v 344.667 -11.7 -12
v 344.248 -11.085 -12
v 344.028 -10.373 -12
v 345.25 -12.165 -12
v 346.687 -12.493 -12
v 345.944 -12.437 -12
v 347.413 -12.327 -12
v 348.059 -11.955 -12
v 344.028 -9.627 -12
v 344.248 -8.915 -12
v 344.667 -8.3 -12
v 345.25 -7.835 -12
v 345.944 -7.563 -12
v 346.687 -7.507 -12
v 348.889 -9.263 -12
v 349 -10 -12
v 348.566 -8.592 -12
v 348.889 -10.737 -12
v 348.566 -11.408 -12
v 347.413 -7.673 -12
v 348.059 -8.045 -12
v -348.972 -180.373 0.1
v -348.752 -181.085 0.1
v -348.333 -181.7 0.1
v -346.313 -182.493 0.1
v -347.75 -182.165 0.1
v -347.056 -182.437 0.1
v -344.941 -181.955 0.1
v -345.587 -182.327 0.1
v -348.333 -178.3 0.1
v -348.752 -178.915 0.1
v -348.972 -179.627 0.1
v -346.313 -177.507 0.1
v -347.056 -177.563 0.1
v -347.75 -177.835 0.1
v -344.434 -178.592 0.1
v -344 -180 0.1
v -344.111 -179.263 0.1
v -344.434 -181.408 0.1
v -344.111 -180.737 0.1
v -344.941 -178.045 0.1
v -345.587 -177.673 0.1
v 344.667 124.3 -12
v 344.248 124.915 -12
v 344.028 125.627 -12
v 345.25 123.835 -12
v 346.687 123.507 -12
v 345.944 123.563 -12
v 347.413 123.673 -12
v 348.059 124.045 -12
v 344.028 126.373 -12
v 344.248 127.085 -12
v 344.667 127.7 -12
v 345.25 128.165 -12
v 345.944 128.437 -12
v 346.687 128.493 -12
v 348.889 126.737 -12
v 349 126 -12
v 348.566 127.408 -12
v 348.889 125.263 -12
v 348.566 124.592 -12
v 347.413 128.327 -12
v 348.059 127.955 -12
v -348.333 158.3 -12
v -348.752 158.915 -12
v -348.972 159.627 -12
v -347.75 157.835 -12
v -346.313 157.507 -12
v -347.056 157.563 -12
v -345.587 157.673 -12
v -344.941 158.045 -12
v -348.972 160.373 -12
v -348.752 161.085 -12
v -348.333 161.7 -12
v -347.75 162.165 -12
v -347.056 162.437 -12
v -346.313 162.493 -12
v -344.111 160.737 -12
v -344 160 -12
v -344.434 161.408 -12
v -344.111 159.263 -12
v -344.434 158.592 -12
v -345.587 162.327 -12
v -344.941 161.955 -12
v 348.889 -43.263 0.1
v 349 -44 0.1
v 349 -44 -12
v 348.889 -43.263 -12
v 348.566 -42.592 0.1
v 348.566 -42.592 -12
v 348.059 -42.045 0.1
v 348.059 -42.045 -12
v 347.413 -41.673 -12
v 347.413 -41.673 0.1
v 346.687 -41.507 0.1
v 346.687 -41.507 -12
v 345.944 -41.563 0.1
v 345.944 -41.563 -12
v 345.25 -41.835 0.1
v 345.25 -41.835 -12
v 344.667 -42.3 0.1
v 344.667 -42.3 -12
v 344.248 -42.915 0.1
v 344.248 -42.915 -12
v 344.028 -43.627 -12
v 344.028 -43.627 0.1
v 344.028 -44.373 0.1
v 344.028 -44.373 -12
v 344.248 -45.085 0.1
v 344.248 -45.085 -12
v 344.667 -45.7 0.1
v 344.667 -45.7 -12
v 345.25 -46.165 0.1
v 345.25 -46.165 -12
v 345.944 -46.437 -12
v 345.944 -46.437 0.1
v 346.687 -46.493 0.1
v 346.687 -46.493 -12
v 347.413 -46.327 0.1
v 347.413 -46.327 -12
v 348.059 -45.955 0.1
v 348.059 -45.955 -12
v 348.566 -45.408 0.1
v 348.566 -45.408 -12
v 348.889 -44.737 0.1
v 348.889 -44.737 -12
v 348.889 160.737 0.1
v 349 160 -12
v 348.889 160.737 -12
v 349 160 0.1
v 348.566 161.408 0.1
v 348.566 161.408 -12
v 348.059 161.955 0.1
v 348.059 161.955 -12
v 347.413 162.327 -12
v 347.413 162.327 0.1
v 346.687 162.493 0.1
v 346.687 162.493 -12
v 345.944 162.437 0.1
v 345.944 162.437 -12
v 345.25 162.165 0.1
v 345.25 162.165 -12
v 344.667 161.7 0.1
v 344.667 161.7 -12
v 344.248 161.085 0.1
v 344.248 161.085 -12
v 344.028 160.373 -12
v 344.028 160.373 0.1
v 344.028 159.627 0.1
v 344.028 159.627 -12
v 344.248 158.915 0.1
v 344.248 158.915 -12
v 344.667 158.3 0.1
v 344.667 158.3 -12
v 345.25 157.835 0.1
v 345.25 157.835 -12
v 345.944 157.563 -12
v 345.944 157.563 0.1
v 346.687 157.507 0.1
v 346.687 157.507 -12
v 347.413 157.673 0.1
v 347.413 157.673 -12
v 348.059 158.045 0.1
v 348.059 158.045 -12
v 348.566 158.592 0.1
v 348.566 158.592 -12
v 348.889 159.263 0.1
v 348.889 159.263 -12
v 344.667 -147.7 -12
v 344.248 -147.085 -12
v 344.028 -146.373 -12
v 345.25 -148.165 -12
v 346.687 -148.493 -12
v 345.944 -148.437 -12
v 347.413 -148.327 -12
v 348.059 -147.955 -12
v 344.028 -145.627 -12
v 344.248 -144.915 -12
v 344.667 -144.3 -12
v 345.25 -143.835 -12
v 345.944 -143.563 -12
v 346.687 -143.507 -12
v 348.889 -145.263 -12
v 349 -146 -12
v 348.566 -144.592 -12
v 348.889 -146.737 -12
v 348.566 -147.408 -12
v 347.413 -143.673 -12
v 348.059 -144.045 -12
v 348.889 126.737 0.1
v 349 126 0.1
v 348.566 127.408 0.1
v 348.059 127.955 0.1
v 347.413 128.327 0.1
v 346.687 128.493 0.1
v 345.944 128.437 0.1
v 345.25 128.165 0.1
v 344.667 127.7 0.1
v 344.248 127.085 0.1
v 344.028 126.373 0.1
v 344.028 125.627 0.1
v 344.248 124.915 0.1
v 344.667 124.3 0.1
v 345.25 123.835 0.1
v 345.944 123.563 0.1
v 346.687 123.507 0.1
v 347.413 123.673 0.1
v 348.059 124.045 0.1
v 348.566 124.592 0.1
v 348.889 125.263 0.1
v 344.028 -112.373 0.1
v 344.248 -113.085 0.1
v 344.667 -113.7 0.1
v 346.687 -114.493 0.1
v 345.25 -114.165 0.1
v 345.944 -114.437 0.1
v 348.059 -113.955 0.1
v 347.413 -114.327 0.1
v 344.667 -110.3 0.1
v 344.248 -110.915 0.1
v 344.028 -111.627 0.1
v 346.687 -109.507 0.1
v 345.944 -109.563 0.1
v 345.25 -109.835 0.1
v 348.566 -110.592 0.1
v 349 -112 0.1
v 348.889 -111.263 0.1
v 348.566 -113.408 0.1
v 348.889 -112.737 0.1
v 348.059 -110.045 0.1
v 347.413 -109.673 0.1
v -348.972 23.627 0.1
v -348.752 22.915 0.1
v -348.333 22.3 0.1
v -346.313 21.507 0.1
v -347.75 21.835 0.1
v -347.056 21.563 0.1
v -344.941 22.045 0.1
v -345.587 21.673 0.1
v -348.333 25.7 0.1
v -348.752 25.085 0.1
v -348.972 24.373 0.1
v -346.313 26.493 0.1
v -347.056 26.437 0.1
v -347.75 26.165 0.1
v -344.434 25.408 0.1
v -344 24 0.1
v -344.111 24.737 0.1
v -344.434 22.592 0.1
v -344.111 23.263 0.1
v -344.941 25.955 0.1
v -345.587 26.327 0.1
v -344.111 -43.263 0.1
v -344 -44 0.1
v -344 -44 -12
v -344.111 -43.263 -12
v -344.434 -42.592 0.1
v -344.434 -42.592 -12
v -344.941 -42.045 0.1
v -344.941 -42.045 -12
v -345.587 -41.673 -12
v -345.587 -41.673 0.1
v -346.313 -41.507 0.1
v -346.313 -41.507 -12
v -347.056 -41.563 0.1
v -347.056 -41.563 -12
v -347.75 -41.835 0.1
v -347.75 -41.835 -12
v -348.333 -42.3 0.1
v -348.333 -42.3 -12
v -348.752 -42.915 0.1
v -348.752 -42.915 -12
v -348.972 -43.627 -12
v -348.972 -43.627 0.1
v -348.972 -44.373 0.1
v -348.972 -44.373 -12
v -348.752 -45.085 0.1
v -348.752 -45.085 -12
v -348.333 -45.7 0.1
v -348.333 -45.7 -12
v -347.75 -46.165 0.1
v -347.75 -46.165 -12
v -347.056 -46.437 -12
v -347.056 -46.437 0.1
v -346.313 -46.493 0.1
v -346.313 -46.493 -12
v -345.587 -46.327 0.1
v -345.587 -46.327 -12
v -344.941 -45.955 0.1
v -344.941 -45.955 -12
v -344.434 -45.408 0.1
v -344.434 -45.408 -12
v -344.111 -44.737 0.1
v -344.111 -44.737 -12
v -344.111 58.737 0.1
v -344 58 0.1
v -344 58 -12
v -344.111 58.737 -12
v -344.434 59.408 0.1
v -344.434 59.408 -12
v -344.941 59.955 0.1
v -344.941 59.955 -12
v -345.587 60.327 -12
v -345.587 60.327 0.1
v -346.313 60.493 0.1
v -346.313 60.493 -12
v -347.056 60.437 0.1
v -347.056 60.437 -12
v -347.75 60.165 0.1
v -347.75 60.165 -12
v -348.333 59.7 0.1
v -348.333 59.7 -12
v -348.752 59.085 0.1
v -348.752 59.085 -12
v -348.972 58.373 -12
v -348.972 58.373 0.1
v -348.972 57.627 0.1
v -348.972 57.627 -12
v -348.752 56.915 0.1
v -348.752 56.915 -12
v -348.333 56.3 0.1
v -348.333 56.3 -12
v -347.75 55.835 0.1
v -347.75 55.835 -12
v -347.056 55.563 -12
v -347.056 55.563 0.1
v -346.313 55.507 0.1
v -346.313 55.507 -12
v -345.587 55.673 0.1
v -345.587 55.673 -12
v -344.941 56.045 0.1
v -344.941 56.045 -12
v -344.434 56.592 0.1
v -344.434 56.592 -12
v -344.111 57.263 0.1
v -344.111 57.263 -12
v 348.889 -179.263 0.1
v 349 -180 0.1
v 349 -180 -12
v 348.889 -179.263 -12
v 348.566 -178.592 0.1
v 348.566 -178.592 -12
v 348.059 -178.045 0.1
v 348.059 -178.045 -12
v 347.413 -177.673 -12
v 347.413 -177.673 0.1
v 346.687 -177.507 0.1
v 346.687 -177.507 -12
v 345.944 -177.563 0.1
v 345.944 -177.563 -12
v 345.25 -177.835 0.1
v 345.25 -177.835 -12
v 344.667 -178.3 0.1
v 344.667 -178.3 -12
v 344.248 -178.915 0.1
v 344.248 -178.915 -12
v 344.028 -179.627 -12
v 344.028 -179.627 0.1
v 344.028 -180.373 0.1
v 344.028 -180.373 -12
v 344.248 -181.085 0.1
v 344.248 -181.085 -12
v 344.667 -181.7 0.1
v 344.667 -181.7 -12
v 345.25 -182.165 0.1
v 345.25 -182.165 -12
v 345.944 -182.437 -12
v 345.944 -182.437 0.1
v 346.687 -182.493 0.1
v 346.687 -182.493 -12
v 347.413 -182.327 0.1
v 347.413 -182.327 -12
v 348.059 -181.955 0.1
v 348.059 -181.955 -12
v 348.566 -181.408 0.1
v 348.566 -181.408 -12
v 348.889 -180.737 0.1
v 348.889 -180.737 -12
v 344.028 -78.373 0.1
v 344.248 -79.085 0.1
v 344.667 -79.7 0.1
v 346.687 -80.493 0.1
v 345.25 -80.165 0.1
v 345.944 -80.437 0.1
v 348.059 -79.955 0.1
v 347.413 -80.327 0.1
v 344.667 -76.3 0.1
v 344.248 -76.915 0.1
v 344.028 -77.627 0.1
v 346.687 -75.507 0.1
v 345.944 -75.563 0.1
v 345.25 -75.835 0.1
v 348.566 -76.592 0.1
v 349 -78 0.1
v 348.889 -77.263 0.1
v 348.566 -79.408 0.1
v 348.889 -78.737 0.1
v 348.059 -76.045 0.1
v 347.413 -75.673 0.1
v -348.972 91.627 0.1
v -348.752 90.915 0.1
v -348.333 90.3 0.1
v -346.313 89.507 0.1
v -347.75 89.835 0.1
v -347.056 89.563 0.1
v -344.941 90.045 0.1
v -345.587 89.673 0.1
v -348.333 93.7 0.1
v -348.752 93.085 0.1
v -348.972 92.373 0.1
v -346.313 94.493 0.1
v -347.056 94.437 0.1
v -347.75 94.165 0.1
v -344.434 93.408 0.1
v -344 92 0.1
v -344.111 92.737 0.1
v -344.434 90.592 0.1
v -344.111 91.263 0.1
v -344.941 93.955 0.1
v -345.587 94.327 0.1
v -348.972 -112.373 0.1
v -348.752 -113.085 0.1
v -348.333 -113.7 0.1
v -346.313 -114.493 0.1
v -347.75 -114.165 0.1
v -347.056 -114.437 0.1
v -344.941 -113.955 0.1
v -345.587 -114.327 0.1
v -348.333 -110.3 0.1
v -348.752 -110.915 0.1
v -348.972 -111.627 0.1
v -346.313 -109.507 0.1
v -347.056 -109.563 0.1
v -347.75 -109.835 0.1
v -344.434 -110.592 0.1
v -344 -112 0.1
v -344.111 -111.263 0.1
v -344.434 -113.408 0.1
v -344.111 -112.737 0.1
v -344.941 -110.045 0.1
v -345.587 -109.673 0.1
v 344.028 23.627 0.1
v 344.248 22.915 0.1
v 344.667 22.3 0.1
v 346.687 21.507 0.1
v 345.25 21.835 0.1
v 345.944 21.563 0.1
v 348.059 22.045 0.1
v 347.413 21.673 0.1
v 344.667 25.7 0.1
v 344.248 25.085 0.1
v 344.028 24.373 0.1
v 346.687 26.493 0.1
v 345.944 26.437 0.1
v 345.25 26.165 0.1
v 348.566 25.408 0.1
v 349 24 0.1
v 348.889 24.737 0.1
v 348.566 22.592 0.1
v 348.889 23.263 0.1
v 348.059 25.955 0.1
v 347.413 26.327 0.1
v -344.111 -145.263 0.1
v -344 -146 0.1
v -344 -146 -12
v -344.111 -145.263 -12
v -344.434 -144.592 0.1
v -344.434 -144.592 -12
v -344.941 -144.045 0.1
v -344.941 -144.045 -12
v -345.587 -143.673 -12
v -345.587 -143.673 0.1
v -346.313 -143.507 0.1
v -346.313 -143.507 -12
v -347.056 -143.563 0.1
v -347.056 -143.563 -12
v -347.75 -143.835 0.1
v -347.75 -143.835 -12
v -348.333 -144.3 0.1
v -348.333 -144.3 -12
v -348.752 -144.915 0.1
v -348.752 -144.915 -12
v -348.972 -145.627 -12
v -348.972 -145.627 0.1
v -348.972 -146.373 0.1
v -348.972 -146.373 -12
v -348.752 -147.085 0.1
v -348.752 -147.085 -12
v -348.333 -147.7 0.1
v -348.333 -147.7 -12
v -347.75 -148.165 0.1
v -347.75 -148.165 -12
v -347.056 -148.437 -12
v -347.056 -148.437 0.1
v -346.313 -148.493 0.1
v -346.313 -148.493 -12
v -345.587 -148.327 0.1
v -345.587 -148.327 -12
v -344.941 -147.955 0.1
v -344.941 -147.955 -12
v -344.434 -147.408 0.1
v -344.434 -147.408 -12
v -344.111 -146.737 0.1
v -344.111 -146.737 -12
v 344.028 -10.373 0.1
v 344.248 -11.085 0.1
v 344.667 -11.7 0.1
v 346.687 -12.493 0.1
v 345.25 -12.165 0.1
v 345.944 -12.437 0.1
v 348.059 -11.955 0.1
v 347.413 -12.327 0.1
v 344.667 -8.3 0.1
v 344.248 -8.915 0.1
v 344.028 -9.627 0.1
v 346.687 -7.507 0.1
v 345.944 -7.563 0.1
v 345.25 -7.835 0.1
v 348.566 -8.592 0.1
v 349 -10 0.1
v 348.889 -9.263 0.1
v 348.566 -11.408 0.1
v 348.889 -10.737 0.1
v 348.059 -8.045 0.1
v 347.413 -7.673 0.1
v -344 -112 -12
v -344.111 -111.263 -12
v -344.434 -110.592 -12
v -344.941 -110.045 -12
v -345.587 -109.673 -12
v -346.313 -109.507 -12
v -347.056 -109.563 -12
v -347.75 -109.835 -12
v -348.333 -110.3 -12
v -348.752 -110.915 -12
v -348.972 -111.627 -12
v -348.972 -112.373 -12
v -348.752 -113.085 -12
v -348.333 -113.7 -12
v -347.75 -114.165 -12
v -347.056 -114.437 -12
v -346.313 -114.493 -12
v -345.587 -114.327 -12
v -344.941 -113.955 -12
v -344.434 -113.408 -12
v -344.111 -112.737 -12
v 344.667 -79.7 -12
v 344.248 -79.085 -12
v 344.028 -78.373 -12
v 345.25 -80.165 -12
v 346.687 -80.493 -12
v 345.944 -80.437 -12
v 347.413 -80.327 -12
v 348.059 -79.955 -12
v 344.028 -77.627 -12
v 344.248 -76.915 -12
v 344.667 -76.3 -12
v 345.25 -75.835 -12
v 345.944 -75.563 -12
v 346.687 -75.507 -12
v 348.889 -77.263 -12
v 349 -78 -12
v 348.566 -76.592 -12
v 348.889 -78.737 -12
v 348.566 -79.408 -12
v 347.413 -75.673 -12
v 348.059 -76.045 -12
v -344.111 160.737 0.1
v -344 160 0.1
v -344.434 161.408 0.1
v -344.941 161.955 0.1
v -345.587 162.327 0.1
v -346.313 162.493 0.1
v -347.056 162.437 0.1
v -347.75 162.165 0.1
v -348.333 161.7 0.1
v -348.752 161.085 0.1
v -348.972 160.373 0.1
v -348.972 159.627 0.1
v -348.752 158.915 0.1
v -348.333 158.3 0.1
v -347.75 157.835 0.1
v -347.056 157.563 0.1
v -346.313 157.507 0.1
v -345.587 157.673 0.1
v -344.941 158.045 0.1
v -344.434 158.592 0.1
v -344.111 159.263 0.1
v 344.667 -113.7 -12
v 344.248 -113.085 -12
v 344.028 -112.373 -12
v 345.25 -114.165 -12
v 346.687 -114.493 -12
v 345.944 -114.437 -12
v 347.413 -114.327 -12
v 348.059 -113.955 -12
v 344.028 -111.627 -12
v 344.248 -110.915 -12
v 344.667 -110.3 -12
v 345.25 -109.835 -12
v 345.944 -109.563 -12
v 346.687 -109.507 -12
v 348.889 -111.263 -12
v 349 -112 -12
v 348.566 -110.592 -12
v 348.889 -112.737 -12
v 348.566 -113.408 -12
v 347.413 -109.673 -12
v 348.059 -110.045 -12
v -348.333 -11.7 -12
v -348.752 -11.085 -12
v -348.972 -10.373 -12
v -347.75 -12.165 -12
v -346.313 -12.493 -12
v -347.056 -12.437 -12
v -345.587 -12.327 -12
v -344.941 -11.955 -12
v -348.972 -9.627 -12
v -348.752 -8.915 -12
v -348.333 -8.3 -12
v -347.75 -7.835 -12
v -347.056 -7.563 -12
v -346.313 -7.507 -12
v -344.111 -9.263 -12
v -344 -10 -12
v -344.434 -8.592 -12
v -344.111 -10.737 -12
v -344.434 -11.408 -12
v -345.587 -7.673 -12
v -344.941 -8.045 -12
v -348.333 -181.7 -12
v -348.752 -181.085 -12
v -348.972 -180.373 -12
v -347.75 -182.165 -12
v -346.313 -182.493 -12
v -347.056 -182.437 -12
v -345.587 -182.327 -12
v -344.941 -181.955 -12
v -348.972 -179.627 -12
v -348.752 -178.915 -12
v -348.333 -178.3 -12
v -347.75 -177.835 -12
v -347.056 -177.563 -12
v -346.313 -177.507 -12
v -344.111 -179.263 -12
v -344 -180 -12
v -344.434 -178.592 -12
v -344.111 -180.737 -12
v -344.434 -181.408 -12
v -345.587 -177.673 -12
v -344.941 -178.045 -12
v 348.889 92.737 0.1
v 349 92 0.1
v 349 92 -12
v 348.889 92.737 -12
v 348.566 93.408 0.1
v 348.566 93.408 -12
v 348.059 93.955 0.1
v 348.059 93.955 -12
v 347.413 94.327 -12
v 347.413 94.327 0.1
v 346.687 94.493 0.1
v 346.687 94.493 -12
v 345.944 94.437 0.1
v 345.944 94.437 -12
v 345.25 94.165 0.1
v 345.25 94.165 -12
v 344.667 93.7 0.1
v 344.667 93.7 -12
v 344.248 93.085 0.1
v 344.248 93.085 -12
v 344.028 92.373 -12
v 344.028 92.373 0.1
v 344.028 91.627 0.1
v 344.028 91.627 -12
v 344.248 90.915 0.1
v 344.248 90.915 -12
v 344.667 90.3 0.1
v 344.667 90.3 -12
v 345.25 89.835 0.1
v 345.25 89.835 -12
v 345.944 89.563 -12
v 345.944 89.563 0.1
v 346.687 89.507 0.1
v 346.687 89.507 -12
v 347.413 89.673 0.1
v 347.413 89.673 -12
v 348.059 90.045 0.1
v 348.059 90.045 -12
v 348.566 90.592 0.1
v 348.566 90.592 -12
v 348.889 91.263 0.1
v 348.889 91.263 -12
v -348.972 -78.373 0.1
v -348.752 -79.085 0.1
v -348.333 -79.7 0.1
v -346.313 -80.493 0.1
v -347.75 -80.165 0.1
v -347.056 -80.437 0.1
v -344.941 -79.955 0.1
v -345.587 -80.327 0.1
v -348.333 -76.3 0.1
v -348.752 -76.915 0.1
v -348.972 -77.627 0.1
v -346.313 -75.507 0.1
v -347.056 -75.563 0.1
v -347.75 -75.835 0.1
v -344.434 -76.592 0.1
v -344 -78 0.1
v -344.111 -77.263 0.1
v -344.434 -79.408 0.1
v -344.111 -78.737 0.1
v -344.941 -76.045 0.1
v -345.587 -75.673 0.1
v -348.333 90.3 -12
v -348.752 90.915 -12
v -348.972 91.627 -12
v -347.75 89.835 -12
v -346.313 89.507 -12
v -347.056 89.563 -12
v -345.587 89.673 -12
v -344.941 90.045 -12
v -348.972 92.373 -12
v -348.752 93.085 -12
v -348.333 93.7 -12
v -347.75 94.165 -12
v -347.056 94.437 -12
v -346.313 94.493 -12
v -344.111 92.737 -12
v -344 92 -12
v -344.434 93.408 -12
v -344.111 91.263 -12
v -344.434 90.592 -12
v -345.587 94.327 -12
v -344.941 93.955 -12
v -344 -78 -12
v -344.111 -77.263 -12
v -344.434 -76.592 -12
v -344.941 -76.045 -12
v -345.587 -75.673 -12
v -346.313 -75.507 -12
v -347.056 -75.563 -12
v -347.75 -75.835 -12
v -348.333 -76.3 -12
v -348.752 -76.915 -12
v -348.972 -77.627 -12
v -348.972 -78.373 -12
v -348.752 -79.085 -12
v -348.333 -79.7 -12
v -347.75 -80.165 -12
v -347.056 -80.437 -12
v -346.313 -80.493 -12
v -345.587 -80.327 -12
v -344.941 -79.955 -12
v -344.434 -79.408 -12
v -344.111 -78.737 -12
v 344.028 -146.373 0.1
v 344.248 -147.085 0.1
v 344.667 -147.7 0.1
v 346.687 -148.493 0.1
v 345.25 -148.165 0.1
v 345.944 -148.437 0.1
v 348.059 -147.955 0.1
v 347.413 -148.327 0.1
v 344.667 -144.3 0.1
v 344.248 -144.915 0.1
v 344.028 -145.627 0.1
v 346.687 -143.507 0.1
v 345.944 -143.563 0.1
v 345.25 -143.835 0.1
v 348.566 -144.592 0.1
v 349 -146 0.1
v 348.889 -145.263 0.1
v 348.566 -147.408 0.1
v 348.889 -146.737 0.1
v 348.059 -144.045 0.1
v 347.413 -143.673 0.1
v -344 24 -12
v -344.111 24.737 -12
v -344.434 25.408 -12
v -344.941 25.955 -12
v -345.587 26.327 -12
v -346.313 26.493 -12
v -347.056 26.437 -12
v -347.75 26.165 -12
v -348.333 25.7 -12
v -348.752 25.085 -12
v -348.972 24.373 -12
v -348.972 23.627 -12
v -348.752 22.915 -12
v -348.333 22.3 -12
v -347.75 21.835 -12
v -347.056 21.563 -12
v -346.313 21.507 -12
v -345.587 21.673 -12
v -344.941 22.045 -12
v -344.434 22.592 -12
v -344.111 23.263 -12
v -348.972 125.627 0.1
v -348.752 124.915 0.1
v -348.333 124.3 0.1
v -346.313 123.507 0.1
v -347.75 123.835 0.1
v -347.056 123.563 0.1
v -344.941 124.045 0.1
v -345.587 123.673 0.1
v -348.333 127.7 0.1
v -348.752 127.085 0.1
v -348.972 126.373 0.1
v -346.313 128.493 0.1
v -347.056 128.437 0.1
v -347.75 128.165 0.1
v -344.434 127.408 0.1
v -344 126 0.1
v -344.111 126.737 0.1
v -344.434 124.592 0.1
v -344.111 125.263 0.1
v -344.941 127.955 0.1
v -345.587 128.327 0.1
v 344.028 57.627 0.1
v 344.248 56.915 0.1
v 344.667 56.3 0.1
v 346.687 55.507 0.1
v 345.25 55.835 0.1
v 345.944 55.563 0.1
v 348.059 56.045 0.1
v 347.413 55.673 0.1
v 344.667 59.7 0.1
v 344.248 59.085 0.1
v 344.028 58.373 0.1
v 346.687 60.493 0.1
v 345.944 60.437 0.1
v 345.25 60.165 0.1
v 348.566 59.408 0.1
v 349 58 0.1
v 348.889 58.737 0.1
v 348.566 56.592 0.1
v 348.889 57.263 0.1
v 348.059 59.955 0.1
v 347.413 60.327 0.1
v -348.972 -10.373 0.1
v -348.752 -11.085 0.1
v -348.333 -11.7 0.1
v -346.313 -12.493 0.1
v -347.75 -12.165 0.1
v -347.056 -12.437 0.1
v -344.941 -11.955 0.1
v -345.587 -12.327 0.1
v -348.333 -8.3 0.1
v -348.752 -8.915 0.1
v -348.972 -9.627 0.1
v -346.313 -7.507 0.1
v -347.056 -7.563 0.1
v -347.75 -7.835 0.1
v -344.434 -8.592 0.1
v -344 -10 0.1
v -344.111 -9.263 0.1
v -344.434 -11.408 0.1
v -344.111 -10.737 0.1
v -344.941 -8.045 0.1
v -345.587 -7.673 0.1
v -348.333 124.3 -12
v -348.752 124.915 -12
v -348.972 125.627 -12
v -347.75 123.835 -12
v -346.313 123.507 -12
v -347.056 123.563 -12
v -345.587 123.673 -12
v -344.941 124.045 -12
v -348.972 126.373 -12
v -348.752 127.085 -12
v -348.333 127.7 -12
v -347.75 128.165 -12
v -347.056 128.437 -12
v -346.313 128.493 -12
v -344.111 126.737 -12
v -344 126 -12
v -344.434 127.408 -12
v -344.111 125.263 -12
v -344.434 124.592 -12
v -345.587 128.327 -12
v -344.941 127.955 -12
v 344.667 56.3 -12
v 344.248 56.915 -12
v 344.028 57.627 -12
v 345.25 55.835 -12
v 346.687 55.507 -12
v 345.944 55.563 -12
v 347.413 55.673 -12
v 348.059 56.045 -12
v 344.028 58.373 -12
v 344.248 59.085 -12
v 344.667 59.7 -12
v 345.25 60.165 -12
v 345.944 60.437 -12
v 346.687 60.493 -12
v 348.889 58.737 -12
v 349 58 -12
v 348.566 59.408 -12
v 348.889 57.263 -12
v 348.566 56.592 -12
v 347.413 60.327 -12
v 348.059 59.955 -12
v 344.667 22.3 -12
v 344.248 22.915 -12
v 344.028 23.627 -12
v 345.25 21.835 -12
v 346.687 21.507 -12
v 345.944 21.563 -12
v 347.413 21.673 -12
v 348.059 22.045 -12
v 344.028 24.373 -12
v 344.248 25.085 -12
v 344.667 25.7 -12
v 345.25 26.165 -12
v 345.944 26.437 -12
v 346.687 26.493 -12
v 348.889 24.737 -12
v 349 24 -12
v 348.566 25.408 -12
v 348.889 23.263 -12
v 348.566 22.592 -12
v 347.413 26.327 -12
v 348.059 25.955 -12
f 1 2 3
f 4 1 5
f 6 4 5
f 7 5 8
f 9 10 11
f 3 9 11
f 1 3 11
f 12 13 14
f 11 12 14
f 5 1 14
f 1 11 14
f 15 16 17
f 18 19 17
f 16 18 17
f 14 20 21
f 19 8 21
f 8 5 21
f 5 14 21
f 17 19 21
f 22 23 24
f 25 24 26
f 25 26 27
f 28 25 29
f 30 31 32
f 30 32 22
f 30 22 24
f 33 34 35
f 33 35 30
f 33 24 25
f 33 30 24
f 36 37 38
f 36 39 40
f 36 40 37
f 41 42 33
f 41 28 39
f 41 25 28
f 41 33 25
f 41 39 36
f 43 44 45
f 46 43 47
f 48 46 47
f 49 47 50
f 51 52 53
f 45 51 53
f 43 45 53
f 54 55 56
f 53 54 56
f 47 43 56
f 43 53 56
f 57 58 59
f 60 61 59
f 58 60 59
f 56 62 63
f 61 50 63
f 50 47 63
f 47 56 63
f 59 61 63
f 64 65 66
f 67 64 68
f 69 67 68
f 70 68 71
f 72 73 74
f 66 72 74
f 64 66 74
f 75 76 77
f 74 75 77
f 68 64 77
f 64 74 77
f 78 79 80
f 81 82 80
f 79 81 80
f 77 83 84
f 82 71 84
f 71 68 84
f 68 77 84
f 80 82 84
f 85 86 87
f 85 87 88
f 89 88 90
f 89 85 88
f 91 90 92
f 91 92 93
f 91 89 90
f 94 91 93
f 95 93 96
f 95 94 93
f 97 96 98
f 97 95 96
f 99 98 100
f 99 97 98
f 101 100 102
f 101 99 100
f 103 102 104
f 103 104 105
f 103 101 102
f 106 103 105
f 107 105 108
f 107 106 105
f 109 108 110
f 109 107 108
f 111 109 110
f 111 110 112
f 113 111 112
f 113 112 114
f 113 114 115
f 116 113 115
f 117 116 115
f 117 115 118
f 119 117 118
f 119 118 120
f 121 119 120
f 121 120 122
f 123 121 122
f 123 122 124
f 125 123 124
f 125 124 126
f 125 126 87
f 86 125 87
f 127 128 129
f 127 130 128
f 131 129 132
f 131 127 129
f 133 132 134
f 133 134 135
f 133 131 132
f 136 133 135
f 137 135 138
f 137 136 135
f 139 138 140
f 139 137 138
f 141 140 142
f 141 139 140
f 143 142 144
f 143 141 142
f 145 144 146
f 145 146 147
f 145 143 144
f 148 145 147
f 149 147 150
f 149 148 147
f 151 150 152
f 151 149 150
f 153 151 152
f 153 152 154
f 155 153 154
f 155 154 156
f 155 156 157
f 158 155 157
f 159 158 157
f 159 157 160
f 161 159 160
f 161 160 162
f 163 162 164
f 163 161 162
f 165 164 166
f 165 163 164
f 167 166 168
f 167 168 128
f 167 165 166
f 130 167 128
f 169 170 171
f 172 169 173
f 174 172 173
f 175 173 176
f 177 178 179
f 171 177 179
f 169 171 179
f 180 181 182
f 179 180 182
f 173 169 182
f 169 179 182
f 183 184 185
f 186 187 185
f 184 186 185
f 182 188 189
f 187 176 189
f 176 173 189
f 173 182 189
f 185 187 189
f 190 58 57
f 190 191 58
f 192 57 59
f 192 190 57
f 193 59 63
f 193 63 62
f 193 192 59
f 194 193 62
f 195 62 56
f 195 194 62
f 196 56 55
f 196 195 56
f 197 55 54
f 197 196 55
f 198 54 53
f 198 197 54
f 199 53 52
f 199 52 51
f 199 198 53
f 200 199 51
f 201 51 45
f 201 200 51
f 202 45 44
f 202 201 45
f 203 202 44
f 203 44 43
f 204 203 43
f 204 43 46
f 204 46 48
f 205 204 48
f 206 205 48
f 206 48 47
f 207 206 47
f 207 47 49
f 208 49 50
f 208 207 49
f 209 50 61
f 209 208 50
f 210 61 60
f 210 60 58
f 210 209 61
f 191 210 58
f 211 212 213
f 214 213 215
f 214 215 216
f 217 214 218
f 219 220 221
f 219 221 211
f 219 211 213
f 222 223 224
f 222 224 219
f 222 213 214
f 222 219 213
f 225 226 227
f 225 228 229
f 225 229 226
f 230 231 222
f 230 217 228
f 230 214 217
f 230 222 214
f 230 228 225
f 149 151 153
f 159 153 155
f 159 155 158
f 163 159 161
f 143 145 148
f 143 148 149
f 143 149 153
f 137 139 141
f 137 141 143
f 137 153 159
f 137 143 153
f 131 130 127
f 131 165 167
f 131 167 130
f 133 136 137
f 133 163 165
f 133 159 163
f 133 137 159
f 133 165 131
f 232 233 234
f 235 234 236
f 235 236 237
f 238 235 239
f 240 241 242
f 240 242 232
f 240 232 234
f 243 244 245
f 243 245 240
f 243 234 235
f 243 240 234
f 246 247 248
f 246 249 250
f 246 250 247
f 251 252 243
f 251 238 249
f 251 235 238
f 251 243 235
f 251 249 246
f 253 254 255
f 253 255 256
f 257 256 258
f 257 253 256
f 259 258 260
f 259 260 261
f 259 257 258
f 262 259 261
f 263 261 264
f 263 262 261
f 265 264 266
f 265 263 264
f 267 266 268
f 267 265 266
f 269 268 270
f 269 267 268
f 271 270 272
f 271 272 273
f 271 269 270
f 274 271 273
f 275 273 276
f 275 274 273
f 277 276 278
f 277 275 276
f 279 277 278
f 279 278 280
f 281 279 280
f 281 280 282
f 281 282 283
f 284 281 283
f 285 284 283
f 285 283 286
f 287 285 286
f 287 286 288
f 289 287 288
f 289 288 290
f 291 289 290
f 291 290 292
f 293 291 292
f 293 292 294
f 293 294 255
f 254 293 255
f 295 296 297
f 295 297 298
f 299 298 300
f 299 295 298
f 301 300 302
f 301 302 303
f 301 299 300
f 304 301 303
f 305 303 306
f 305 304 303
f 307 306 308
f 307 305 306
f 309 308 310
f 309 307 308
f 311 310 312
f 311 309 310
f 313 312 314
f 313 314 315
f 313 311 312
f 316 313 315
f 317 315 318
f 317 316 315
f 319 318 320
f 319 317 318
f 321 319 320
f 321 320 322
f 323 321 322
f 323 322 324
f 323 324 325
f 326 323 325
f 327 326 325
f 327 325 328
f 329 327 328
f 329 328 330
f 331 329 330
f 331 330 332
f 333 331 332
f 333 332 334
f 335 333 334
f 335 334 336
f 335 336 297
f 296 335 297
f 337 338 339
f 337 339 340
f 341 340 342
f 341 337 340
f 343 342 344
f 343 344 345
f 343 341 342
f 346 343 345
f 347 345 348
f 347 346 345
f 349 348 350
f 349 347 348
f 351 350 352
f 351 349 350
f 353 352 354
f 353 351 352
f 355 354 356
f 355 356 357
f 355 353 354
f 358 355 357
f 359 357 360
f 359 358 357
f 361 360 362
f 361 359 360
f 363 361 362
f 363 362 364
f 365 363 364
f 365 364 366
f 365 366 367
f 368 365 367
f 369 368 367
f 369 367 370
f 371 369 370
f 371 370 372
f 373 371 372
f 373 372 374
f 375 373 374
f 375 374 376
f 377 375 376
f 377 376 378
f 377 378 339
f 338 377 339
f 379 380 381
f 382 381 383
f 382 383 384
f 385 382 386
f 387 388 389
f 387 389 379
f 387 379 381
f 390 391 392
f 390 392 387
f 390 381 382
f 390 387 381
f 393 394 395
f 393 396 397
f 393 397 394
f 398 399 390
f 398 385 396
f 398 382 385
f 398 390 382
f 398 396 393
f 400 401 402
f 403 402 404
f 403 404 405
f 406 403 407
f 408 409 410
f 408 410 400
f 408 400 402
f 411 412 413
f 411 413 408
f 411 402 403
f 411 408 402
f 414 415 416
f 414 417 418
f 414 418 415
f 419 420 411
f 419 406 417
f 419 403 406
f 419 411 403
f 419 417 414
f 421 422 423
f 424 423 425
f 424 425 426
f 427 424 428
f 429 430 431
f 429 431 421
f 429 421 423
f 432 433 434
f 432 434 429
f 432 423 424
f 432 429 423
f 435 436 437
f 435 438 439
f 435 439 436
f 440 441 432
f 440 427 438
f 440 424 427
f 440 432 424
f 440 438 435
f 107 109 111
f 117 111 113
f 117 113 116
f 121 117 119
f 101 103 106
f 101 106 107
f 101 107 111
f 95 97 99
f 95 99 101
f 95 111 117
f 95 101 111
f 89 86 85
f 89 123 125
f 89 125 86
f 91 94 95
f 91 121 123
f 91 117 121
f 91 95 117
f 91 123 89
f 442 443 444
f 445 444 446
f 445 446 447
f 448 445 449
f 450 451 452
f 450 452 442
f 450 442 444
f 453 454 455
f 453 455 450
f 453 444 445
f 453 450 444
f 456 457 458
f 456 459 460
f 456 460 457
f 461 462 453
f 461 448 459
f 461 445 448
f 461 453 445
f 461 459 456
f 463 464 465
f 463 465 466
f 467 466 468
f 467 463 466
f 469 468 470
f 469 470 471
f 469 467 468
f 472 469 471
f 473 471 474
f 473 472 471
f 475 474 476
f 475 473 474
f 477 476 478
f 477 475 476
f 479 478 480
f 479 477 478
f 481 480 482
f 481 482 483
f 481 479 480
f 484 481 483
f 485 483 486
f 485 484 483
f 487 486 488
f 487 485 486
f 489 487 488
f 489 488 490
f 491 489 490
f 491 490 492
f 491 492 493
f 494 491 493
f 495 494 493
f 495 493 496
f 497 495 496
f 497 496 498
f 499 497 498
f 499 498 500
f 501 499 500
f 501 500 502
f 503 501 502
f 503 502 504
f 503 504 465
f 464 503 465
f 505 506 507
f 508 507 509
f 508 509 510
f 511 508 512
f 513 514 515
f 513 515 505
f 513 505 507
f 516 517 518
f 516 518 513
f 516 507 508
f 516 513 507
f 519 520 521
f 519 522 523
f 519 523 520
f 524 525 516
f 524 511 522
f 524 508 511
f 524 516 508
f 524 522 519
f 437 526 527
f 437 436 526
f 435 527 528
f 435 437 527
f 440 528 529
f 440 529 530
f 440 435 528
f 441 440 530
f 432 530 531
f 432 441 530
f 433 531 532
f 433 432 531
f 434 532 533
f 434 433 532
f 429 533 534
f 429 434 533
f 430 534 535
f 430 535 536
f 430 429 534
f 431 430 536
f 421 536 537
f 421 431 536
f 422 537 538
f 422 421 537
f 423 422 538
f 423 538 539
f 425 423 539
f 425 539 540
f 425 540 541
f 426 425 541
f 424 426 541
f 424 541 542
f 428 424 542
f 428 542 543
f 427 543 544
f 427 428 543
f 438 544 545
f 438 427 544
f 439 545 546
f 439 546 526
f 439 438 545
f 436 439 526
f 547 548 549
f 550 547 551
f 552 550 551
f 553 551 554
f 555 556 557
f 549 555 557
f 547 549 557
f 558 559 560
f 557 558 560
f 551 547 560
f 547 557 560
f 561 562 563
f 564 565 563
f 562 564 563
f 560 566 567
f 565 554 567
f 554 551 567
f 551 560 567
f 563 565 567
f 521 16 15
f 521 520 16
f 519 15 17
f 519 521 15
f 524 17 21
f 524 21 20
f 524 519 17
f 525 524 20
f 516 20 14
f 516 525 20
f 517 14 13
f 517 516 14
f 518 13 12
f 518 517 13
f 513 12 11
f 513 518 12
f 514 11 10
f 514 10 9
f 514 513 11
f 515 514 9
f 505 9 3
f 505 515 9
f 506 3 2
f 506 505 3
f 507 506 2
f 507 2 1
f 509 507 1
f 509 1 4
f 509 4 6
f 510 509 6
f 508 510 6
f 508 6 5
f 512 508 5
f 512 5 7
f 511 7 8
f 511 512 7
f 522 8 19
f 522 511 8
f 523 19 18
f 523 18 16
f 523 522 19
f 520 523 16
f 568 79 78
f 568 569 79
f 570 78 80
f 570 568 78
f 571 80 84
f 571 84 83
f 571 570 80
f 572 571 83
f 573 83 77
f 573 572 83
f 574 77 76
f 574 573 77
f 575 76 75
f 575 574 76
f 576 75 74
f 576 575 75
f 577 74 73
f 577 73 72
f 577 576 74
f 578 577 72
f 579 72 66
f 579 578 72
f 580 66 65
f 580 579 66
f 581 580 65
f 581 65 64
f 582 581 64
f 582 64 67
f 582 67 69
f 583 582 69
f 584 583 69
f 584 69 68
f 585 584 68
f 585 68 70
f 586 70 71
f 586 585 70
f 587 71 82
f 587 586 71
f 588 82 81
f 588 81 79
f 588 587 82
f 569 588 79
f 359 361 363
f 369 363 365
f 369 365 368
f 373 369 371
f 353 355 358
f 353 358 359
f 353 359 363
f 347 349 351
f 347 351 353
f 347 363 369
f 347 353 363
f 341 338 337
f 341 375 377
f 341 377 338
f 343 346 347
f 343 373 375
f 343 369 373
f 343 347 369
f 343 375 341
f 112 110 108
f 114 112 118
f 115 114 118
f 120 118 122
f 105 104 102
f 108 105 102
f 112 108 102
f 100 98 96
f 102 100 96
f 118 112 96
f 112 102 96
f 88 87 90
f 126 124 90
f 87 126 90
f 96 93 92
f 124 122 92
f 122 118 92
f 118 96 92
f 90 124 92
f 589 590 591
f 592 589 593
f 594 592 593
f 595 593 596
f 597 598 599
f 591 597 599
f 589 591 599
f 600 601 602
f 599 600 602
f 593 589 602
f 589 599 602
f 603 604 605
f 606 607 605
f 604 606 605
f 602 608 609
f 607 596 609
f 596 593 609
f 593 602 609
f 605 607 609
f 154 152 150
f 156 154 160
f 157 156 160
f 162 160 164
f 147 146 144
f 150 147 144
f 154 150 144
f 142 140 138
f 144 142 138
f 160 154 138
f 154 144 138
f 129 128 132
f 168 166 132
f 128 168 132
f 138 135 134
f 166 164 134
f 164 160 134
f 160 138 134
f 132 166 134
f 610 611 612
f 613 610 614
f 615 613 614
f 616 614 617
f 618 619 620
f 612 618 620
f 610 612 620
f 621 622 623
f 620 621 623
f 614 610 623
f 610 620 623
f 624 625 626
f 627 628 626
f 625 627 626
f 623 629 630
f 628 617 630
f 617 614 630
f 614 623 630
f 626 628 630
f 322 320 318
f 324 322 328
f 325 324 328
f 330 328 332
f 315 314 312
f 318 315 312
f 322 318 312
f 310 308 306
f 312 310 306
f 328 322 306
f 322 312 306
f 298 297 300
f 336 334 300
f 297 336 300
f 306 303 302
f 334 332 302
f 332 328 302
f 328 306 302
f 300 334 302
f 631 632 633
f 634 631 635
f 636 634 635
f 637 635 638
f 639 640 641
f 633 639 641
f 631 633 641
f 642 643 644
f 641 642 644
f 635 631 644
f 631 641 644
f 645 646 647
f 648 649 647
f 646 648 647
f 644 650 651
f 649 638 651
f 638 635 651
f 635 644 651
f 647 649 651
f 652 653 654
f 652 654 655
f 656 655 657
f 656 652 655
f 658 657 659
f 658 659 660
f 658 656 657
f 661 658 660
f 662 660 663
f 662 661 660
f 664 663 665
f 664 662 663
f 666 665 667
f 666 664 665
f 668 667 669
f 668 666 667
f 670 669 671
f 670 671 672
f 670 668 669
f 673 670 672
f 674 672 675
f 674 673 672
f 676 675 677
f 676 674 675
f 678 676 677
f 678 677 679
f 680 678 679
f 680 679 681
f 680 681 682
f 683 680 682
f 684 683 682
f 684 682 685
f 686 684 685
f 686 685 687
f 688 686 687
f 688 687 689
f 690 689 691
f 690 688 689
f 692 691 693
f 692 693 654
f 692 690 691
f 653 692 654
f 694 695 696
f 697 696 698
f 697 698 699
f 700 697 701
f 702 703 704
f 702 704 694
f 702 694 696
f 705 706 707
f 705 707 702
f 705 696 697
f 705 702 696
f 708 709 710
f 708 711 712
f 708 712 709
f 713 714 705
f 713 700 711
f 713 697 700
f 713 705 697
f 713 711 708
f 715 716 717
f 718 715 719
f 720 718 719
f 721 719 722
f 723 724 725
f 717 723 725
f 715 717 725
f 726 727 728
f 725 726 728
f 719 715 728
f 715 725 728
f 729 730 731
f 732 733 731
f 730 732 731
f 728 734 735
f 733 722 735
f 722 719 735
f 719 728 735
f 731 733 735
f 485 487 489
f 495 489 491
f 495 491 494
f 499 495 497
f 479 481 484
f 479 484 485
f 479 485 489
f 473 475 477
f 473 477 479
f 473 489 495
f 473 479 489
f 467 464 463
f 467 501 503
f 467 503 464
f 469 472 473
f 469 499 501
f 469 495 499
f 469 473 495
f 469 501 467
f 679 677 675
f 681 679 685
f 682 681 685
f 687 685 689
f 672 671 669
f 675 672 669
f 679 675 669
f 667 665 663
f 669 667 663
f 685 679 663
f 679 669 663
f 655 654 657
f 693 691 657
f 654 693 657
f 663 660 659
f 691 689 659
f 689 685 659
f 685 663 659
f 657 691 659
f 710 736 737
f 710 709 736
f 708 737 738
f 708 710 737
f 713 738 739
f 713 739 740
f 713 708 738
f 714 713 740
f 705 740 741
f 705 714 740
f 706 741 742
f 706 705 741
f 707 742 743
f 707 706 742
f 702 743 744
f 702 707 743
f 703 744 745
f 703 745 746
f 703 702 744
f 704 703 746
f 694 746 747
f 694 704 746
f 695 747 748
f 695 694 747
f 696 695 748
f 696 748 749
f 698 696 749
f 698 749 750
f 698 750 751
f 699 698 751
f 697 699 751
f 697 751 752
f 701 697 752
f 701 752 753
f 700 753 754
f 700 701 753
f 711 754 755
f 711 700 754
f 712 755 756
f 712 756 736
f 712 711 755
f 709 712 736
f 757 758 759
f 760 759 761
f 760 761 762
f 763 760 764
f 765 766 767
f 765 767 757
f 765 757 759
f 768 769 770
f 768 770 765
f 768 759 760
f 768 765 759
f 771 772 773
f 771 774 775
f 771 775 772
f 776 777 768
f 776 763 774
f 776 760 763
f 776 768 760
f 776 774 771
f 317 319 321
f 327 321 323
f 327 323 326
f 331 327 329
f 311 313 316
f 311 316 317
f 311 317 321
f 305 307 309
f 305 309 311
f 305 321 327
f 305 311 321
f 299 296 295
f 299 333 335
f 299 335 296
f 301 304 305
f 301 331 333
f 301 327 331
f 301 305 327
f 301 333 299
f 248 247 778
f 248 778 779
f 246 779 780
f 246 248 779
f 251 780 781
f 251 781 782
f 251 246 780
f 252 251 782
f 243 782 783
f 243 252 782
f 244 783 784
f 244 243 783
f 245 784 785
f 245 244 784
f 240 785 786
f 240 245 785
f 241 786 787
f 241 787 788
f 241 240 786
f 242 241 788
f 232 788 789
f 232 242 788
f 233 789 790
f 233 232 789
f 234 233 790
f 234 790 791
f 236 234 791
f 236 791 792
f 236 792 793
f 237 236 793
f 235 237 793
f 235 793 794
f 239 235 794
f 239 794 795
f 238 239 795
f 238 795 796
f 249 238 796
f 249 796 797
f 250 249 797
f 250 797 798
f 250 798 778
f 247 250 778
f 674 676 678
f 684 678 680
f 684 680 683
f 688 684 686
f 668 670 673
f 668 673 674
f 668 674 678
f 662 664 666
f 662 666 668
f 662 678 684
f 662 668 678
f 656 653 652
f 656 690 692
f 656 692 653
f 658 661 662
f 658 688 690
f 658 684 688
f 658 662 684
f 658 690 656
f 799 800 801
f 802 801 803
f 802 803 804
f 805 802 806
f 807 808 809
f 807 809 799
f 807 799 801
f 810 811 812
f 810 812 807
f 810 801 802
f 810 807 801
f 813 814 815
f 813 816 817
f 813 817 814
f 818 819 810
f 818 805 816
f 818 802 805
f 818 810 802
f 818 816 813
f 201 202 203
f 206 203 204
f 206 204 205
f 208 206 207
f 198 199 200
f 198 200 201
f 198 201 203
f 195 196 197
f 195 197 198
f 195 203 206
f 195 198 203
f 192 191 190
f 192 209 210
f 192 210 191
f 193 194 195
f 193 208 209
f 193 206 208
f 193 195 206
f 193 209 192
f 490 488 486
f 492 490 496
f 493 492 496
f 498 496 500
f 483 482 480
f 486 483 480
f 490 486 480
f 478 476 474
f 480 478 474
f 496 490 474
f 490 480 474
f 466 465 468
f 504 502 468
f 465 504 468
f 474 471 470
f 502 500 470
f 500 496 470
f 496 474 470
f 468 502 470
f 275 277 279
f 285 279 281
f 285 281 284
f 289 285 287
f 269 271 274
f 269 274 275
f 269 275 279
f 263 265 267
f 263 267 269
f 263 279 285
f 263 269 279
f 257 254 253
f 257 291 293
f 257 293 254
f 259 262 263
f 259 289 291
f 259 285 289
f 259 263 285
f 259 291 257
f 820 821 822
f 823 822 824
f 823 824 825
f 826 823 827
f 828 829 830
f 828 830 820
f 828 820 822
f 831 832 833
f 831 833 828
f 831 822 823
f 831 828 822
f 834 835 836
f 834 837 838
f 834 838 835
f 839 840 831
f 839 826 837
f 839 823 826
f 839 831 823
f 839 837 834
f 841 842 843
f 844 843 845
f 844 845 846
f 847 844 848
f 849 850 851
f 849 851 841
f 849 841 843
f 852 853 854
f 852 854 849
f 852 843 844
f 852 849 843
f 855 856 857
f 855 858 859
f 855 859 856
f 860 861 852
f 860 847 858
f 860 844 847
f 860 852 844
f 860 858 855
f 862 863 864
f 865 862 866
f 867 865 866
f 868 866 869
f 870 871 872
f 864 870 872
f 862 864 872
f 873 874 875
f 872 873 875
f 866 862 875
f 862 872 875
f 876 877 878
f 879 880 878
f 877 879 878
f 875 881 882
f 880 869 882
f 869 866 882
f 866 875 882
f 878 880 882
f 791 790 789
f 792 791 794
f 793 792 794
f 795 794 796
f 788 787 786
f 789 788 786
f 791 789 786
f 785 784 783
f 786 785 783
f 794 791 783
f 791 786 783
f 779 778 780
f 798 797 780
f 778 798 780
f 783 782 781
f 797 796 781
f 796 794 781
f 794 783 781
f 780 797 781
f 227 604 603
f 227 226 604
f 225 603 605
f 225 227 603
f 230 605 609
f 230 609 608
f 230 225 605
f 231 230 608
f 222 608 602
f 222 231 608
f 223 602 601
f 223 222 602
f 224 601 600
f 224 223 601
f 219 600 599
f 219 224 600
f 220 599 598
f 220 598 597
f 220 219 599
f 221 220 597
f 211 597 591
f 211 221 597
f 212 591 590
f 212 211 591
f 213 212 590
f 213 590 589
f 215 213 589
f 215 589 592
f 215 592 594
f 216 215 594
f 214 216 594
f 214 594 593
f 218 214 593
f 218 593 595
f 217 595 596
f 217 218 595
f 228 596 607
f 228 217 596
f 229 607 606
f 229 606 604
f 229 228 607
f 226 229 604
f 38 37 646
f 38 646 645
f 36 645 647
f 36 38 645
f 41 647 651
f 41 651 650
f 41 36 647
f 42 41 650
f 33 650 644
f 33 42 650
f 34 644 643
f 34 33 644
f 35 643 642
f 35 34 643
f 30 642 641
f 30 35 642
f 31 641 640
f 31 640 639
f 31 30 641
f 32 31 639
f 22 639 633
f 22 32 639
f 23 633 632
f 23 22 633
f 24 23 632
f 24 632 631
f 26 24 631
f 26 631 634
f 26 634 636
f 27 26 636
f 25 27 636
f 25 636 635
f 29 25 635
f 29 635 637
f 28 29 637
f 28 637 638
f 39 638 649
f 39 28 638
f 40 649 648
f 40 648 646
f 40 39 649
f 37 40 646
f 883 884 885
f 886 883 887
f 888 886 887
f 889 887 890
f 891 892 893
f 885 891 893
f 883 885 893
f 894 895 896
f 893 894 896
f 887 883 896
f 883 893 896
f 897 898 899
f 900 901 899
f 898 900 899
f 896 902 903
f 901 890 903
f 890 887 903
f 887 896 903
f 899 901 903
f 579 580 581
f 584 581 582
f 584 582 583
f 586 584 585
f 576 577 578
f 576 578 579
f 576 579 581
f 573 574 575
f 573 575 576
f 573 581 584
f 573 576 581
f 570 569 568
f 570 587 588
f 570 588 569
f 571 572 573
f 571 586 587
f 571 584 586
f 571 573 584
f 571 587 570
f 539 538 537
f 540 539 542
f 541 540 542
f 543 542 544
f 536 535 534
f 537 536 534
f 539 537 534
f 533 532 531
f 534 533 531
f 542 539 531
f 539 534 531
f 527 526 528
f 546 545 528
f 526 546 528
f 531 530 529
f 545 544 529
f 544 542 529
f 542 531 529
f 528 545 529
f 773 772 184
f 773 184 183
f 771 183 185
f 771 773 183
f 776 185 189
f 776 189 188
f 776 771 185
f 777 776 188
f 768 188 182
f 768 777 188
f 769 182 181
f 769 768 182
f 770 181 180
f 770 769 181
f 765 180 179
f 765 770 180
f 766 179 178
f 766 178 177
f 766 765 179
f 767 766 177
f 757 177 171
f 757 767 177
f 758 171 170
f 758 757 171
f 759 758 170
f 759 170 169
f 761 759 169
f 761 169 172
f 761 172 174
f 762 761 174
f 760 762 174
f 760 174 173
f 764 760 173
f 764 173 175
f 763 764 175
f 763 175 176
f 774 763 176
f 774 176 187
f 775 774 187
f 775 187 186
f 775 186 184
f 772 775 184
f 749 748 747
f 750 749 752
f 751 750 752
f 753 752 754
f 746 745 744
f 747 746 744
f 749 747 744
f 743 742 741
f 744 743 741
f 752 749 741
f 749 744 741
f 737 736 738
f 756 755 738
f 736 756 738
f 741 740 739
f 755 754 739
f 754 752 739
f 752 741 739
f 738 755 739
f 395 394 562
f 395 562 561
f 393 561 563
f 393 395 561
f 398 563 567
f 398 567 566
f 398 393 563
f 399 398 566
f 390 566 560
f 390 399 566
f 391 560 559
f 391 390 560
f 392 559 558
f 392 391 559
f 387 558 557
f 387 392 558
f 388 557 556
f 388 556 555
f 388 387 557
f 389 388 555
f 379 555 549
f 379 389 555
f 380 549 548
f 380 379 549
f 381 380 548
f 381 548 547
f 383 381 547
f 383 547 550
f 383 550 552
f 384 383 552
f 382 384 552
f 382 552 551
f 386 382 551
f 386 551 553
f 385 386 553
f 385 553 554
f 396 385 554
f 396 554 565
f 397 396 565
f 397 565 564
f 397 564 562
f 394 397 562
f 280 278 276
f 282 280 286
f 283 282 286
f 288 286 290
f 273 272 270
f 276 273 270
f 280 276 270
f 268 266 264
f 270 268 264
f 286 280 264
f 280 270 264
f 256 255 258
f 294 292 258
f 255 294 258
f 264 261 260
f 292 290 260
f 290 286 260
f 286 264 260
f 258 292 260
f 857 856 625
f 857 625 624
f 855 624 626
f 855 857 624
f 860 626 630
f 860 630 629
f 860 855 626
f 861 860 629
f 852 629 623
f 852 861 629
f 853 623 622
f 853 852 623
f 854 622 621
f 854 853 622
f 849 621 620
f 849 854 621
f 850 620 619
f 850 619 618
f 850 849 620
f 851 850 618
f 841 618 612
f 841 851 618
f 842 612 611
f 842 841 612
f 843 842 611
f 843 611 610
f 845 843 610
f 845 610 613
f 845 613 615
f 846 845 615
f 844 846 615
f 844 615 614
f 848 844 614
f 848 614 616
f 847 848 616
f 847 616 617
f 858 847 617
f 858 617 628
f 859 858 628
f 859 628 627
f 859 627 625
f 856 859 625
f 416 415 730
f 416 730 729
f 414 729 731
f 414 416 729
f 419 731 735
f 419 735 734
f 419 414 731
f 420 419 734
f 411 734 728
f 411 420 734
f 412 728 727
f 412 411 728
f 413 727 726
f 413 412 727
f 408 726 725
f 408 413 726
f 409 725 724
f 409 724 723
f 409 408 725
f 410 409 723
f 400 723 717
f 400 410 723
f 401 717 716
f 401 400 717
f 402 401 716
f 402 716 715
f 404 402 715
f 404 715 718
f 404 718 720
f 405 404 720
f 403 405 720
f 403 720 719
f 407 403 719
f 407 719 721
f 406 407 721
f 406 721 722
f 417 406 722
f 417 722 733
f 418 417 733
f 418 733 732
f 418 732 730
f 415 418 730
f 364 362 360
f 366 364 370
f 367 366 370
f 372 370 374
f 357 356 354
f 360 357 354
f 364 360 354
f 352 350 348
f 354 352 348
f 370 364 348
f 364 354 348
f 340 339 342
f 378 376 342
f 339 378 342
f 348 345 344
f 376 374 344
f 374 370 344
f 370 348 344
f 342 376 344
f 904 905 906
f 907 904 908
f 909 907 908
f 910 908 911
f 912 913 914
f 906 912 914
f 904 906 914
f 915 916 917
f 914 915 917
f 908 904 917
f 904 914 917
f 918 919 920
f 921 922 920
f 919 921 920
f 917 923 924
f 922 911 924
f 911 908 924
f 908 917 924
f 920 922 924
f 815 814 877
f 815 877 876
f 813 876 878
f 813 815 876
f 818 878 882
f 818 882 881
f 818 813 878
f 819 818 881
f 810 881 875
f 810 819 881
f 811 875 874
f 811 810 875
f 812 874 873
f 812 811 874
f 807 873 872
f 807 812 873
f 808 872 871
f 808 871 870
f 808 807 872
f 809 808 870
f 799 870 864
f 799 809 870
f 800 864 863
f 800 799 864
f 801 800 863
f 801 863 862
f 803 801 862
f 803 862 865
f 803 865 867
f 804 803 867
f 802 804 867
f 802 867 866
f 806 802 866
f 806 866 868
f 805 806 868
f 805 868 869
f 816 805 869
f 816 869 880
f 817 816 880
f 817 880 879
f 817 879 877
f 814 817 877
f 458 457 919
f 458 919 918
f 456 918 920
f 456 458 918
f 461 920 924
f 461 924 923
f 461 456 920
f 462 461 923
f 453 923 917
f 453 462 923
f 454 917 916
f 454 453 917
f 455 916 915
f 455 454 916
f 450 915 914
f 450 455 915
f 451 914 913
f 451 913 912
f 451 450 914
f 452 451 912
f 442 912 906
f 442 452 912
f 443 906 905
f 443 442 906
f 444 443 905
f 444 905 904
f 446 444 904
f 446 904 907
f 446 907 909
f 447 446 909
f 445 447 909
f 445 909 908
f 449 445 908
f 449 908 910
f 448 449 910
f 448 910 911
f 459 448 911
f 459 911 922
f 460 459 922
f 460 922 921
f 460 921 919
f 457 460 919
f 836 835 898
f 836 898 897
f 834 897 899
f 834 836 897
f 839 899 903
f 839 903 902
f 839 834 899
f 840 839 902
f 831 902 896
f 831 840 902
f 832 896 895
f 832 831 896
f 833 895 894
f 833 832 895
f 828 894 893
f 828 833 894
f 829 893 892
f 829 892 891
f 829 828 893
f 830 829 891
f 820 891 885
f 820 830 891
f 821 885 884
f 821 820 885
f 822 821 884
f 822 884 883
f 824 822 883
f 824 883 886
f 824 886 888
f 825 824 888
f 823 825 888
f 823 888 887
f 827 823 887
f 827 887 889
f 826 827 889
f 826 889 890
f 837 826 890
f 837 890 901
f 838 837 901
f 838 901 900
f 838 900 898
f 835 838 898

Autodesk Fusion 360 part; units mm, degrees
sketch "Control" plane through (0, 0, 0) normal (0, 0, 1) x (1, 0, 0)
  line L0 (378.5, -280) -> (-378.5, -280)
  line L1 (-378.5, -280) -> (-378.5, 280)
  line L2 (-378.5, 280) -> (378.5, 280)
  line L3 (378.5, 280) -> (378.5, -280)
  line L4 (378.5, -280) -> (-378.5, 280) construction
  line L5 (-378.5, -280) -> (378.5, 280) construction
  point P0 (0, 160)
  dimension "d7" = 560
  dimension "d8" = 757
  dimension "d9" = 378.5
  dimension "d100" = 120
ref_plane "WorkPlane1" through (0, 160, 0) normal (0, 1, 0) x (0, 0, 1)
ref_plane "WorkPlane2" through (0, 0, 0) normal (1, 0, 0) x (0, 1, 0)
sketch "Sketch5" plane through (0, 0, 0) normal (0, 0, 1) x (1, 0, 0)
  line L0 (346.5, 160) -> (-346.5, 160) construction
  line L1 (-378.5, 280) -> (378.5, 280) construction
  line L2 (378.5, 280) -> (378.5, -280) construction
  line L3 (-378.5, -280) -> (-378.5, 280) construction
  circle A0 centre (-346.5, 160) radius 2.5
  circle A1 centre (346.5, 160) radius 2.5
  dimension "d116" = 120
  dimension "d117" = 32
  dimension "d118" = 32
  dimension "d119" = 5
  dimension "d120" = 5
extrude "Extrude1" add sketch "Sketch5" along normal blind -12 and the other way blind -0.1 makes body 1 at (-346.9341, 162.462, -7.9667) makes body 2 at (346.0659, 162.462, -7.9667)
copy_body "Body->Comp1" bodies 1 removing the originals makes body 3 in component "Component"
copy_body "Body->Comp2" bodies 2 removing the originals makes body 4 in component "Component'"
pattern_linear "00000000-0000-0000-0000-000000000000" [suppressed]
component "Component" placed x (1, 0, 0) y (0, 1, 0) z (0, 0, 1) at (0, 0, 0)
component "Component'" placed x (1, 0, 0) y (0, 1, 0) z (0, 0, 1) at (0, 0, 0)
component "Component" placed x (1, 0, 0) y (0, 1, 0) z (0, 0, 1) at (0, -34, 0)
component "Component'" placed x (1, 0, 0) y (0, 1, 0) z (0, 0, 1) at (0, -34, 0)
component "Component" placed x (1, 0, 0) y (0, 1, 0) z (0, 0, 1) at (0, -68, 0)
component "Component'" placed x (1, 0, 0) y (0, 1, 0) z (0, 0, 1) at (0, -68, 0)
component "Component" placed x (1, 0, 0) y (0, 1, 0) z (0, 0, 1) at (0, -102, 0)
component "Component'" placed x (1, 0, 0) y (0, 1, 0) z (0, 0, 1) at (0, -102, 0)
component "Component" placed x (1, 0, 0) y (0, 1, 0) z (0, 0, 1) at (0, -136, 0)
component "Component'" placed x (1, 0, 0) y (0, 1, 0) z (0, 0, 1) at (0, -136, 0)
component "Component" placed x (1, 0, 0) y (0, 1, 0) z (0, 0, 1) at (0, -170, 0)
component "Component'" placed x (1, 0, 0) y (0, 1, 0) z (0, 0, 1) at (0, -170, 0)
component "Component" placed x (1, 0, 0) y (0, 1, 0) z (0, 0, 1) at (0, -204, 0)
component "Component'" placed x (1, 0, 0) y (0, 1, 0) z (0, 0, 1) at (0, -204, 0)
component "Component" placed x (1, 0, 0) y (0, 1, 0) z (0, 0, 1) at (0, -238, 0)
component "Component'" placed x (1, 0, 0) y (0, 1, 0) z (0, 0, 1) at (0, -238, 0)
component "Component" placed x (1, 0, 0) y (0, 1, 0) z (0, 0, 1) at (0, -272, 0)
component "Component'" placed x (1, 0, 0) y (0, 1, 0) z (0, 0, 1) at (0, -272, 0)
component "Component" placed x (1, 0, 0) y (0, 1, 0) z (0, 0, 1) at (0, -306, 0)
component "Component'" placed x (1, 0, 0) y (0, 1, 0) z (0, 0, 1) at (0, -306, 0)
component "Component" placed x (1, 0, 0) y (0, 1, 0) z (0, 0, 1) at (0, -340, 0)
component "Component'" placed x (1, 0, 0) y (0, 1, 0) z (0, 0, 1) at (0, -340, 0)
equation "FacadeWidth = 757.00 mm"
equation "FacadeHeight = 560.00 mm"
equation "HandleHorPos = FacadeWidth / 2"
equation "TopDistance = 120 mm"
equation "d7 = FacadeHeight"
equation "d8 = FacadeWidth"
equation "d9 = HandleHorPos"
equation "FacadeThickness = 18 mm"
equation "d100 = TopDistance"
equation "BottomDistance = 100 mm"
equation "FrontDistance = 32 mm"
equation "d116 = TopDistance"
equation "d117 = FrontDistance"
equation "d118 = d117"
equation "Spacing = 32 mm"
equation "Nbr_pin = floor(( FacadeHeight - TopDistance - BottomDistance ) / Spacing)"
equation "d131 = Nbr_pin + 1"
equation "d133 = ( -FacadeHeight + TopDistance + BottomDistance ) / Nbr_pin"
